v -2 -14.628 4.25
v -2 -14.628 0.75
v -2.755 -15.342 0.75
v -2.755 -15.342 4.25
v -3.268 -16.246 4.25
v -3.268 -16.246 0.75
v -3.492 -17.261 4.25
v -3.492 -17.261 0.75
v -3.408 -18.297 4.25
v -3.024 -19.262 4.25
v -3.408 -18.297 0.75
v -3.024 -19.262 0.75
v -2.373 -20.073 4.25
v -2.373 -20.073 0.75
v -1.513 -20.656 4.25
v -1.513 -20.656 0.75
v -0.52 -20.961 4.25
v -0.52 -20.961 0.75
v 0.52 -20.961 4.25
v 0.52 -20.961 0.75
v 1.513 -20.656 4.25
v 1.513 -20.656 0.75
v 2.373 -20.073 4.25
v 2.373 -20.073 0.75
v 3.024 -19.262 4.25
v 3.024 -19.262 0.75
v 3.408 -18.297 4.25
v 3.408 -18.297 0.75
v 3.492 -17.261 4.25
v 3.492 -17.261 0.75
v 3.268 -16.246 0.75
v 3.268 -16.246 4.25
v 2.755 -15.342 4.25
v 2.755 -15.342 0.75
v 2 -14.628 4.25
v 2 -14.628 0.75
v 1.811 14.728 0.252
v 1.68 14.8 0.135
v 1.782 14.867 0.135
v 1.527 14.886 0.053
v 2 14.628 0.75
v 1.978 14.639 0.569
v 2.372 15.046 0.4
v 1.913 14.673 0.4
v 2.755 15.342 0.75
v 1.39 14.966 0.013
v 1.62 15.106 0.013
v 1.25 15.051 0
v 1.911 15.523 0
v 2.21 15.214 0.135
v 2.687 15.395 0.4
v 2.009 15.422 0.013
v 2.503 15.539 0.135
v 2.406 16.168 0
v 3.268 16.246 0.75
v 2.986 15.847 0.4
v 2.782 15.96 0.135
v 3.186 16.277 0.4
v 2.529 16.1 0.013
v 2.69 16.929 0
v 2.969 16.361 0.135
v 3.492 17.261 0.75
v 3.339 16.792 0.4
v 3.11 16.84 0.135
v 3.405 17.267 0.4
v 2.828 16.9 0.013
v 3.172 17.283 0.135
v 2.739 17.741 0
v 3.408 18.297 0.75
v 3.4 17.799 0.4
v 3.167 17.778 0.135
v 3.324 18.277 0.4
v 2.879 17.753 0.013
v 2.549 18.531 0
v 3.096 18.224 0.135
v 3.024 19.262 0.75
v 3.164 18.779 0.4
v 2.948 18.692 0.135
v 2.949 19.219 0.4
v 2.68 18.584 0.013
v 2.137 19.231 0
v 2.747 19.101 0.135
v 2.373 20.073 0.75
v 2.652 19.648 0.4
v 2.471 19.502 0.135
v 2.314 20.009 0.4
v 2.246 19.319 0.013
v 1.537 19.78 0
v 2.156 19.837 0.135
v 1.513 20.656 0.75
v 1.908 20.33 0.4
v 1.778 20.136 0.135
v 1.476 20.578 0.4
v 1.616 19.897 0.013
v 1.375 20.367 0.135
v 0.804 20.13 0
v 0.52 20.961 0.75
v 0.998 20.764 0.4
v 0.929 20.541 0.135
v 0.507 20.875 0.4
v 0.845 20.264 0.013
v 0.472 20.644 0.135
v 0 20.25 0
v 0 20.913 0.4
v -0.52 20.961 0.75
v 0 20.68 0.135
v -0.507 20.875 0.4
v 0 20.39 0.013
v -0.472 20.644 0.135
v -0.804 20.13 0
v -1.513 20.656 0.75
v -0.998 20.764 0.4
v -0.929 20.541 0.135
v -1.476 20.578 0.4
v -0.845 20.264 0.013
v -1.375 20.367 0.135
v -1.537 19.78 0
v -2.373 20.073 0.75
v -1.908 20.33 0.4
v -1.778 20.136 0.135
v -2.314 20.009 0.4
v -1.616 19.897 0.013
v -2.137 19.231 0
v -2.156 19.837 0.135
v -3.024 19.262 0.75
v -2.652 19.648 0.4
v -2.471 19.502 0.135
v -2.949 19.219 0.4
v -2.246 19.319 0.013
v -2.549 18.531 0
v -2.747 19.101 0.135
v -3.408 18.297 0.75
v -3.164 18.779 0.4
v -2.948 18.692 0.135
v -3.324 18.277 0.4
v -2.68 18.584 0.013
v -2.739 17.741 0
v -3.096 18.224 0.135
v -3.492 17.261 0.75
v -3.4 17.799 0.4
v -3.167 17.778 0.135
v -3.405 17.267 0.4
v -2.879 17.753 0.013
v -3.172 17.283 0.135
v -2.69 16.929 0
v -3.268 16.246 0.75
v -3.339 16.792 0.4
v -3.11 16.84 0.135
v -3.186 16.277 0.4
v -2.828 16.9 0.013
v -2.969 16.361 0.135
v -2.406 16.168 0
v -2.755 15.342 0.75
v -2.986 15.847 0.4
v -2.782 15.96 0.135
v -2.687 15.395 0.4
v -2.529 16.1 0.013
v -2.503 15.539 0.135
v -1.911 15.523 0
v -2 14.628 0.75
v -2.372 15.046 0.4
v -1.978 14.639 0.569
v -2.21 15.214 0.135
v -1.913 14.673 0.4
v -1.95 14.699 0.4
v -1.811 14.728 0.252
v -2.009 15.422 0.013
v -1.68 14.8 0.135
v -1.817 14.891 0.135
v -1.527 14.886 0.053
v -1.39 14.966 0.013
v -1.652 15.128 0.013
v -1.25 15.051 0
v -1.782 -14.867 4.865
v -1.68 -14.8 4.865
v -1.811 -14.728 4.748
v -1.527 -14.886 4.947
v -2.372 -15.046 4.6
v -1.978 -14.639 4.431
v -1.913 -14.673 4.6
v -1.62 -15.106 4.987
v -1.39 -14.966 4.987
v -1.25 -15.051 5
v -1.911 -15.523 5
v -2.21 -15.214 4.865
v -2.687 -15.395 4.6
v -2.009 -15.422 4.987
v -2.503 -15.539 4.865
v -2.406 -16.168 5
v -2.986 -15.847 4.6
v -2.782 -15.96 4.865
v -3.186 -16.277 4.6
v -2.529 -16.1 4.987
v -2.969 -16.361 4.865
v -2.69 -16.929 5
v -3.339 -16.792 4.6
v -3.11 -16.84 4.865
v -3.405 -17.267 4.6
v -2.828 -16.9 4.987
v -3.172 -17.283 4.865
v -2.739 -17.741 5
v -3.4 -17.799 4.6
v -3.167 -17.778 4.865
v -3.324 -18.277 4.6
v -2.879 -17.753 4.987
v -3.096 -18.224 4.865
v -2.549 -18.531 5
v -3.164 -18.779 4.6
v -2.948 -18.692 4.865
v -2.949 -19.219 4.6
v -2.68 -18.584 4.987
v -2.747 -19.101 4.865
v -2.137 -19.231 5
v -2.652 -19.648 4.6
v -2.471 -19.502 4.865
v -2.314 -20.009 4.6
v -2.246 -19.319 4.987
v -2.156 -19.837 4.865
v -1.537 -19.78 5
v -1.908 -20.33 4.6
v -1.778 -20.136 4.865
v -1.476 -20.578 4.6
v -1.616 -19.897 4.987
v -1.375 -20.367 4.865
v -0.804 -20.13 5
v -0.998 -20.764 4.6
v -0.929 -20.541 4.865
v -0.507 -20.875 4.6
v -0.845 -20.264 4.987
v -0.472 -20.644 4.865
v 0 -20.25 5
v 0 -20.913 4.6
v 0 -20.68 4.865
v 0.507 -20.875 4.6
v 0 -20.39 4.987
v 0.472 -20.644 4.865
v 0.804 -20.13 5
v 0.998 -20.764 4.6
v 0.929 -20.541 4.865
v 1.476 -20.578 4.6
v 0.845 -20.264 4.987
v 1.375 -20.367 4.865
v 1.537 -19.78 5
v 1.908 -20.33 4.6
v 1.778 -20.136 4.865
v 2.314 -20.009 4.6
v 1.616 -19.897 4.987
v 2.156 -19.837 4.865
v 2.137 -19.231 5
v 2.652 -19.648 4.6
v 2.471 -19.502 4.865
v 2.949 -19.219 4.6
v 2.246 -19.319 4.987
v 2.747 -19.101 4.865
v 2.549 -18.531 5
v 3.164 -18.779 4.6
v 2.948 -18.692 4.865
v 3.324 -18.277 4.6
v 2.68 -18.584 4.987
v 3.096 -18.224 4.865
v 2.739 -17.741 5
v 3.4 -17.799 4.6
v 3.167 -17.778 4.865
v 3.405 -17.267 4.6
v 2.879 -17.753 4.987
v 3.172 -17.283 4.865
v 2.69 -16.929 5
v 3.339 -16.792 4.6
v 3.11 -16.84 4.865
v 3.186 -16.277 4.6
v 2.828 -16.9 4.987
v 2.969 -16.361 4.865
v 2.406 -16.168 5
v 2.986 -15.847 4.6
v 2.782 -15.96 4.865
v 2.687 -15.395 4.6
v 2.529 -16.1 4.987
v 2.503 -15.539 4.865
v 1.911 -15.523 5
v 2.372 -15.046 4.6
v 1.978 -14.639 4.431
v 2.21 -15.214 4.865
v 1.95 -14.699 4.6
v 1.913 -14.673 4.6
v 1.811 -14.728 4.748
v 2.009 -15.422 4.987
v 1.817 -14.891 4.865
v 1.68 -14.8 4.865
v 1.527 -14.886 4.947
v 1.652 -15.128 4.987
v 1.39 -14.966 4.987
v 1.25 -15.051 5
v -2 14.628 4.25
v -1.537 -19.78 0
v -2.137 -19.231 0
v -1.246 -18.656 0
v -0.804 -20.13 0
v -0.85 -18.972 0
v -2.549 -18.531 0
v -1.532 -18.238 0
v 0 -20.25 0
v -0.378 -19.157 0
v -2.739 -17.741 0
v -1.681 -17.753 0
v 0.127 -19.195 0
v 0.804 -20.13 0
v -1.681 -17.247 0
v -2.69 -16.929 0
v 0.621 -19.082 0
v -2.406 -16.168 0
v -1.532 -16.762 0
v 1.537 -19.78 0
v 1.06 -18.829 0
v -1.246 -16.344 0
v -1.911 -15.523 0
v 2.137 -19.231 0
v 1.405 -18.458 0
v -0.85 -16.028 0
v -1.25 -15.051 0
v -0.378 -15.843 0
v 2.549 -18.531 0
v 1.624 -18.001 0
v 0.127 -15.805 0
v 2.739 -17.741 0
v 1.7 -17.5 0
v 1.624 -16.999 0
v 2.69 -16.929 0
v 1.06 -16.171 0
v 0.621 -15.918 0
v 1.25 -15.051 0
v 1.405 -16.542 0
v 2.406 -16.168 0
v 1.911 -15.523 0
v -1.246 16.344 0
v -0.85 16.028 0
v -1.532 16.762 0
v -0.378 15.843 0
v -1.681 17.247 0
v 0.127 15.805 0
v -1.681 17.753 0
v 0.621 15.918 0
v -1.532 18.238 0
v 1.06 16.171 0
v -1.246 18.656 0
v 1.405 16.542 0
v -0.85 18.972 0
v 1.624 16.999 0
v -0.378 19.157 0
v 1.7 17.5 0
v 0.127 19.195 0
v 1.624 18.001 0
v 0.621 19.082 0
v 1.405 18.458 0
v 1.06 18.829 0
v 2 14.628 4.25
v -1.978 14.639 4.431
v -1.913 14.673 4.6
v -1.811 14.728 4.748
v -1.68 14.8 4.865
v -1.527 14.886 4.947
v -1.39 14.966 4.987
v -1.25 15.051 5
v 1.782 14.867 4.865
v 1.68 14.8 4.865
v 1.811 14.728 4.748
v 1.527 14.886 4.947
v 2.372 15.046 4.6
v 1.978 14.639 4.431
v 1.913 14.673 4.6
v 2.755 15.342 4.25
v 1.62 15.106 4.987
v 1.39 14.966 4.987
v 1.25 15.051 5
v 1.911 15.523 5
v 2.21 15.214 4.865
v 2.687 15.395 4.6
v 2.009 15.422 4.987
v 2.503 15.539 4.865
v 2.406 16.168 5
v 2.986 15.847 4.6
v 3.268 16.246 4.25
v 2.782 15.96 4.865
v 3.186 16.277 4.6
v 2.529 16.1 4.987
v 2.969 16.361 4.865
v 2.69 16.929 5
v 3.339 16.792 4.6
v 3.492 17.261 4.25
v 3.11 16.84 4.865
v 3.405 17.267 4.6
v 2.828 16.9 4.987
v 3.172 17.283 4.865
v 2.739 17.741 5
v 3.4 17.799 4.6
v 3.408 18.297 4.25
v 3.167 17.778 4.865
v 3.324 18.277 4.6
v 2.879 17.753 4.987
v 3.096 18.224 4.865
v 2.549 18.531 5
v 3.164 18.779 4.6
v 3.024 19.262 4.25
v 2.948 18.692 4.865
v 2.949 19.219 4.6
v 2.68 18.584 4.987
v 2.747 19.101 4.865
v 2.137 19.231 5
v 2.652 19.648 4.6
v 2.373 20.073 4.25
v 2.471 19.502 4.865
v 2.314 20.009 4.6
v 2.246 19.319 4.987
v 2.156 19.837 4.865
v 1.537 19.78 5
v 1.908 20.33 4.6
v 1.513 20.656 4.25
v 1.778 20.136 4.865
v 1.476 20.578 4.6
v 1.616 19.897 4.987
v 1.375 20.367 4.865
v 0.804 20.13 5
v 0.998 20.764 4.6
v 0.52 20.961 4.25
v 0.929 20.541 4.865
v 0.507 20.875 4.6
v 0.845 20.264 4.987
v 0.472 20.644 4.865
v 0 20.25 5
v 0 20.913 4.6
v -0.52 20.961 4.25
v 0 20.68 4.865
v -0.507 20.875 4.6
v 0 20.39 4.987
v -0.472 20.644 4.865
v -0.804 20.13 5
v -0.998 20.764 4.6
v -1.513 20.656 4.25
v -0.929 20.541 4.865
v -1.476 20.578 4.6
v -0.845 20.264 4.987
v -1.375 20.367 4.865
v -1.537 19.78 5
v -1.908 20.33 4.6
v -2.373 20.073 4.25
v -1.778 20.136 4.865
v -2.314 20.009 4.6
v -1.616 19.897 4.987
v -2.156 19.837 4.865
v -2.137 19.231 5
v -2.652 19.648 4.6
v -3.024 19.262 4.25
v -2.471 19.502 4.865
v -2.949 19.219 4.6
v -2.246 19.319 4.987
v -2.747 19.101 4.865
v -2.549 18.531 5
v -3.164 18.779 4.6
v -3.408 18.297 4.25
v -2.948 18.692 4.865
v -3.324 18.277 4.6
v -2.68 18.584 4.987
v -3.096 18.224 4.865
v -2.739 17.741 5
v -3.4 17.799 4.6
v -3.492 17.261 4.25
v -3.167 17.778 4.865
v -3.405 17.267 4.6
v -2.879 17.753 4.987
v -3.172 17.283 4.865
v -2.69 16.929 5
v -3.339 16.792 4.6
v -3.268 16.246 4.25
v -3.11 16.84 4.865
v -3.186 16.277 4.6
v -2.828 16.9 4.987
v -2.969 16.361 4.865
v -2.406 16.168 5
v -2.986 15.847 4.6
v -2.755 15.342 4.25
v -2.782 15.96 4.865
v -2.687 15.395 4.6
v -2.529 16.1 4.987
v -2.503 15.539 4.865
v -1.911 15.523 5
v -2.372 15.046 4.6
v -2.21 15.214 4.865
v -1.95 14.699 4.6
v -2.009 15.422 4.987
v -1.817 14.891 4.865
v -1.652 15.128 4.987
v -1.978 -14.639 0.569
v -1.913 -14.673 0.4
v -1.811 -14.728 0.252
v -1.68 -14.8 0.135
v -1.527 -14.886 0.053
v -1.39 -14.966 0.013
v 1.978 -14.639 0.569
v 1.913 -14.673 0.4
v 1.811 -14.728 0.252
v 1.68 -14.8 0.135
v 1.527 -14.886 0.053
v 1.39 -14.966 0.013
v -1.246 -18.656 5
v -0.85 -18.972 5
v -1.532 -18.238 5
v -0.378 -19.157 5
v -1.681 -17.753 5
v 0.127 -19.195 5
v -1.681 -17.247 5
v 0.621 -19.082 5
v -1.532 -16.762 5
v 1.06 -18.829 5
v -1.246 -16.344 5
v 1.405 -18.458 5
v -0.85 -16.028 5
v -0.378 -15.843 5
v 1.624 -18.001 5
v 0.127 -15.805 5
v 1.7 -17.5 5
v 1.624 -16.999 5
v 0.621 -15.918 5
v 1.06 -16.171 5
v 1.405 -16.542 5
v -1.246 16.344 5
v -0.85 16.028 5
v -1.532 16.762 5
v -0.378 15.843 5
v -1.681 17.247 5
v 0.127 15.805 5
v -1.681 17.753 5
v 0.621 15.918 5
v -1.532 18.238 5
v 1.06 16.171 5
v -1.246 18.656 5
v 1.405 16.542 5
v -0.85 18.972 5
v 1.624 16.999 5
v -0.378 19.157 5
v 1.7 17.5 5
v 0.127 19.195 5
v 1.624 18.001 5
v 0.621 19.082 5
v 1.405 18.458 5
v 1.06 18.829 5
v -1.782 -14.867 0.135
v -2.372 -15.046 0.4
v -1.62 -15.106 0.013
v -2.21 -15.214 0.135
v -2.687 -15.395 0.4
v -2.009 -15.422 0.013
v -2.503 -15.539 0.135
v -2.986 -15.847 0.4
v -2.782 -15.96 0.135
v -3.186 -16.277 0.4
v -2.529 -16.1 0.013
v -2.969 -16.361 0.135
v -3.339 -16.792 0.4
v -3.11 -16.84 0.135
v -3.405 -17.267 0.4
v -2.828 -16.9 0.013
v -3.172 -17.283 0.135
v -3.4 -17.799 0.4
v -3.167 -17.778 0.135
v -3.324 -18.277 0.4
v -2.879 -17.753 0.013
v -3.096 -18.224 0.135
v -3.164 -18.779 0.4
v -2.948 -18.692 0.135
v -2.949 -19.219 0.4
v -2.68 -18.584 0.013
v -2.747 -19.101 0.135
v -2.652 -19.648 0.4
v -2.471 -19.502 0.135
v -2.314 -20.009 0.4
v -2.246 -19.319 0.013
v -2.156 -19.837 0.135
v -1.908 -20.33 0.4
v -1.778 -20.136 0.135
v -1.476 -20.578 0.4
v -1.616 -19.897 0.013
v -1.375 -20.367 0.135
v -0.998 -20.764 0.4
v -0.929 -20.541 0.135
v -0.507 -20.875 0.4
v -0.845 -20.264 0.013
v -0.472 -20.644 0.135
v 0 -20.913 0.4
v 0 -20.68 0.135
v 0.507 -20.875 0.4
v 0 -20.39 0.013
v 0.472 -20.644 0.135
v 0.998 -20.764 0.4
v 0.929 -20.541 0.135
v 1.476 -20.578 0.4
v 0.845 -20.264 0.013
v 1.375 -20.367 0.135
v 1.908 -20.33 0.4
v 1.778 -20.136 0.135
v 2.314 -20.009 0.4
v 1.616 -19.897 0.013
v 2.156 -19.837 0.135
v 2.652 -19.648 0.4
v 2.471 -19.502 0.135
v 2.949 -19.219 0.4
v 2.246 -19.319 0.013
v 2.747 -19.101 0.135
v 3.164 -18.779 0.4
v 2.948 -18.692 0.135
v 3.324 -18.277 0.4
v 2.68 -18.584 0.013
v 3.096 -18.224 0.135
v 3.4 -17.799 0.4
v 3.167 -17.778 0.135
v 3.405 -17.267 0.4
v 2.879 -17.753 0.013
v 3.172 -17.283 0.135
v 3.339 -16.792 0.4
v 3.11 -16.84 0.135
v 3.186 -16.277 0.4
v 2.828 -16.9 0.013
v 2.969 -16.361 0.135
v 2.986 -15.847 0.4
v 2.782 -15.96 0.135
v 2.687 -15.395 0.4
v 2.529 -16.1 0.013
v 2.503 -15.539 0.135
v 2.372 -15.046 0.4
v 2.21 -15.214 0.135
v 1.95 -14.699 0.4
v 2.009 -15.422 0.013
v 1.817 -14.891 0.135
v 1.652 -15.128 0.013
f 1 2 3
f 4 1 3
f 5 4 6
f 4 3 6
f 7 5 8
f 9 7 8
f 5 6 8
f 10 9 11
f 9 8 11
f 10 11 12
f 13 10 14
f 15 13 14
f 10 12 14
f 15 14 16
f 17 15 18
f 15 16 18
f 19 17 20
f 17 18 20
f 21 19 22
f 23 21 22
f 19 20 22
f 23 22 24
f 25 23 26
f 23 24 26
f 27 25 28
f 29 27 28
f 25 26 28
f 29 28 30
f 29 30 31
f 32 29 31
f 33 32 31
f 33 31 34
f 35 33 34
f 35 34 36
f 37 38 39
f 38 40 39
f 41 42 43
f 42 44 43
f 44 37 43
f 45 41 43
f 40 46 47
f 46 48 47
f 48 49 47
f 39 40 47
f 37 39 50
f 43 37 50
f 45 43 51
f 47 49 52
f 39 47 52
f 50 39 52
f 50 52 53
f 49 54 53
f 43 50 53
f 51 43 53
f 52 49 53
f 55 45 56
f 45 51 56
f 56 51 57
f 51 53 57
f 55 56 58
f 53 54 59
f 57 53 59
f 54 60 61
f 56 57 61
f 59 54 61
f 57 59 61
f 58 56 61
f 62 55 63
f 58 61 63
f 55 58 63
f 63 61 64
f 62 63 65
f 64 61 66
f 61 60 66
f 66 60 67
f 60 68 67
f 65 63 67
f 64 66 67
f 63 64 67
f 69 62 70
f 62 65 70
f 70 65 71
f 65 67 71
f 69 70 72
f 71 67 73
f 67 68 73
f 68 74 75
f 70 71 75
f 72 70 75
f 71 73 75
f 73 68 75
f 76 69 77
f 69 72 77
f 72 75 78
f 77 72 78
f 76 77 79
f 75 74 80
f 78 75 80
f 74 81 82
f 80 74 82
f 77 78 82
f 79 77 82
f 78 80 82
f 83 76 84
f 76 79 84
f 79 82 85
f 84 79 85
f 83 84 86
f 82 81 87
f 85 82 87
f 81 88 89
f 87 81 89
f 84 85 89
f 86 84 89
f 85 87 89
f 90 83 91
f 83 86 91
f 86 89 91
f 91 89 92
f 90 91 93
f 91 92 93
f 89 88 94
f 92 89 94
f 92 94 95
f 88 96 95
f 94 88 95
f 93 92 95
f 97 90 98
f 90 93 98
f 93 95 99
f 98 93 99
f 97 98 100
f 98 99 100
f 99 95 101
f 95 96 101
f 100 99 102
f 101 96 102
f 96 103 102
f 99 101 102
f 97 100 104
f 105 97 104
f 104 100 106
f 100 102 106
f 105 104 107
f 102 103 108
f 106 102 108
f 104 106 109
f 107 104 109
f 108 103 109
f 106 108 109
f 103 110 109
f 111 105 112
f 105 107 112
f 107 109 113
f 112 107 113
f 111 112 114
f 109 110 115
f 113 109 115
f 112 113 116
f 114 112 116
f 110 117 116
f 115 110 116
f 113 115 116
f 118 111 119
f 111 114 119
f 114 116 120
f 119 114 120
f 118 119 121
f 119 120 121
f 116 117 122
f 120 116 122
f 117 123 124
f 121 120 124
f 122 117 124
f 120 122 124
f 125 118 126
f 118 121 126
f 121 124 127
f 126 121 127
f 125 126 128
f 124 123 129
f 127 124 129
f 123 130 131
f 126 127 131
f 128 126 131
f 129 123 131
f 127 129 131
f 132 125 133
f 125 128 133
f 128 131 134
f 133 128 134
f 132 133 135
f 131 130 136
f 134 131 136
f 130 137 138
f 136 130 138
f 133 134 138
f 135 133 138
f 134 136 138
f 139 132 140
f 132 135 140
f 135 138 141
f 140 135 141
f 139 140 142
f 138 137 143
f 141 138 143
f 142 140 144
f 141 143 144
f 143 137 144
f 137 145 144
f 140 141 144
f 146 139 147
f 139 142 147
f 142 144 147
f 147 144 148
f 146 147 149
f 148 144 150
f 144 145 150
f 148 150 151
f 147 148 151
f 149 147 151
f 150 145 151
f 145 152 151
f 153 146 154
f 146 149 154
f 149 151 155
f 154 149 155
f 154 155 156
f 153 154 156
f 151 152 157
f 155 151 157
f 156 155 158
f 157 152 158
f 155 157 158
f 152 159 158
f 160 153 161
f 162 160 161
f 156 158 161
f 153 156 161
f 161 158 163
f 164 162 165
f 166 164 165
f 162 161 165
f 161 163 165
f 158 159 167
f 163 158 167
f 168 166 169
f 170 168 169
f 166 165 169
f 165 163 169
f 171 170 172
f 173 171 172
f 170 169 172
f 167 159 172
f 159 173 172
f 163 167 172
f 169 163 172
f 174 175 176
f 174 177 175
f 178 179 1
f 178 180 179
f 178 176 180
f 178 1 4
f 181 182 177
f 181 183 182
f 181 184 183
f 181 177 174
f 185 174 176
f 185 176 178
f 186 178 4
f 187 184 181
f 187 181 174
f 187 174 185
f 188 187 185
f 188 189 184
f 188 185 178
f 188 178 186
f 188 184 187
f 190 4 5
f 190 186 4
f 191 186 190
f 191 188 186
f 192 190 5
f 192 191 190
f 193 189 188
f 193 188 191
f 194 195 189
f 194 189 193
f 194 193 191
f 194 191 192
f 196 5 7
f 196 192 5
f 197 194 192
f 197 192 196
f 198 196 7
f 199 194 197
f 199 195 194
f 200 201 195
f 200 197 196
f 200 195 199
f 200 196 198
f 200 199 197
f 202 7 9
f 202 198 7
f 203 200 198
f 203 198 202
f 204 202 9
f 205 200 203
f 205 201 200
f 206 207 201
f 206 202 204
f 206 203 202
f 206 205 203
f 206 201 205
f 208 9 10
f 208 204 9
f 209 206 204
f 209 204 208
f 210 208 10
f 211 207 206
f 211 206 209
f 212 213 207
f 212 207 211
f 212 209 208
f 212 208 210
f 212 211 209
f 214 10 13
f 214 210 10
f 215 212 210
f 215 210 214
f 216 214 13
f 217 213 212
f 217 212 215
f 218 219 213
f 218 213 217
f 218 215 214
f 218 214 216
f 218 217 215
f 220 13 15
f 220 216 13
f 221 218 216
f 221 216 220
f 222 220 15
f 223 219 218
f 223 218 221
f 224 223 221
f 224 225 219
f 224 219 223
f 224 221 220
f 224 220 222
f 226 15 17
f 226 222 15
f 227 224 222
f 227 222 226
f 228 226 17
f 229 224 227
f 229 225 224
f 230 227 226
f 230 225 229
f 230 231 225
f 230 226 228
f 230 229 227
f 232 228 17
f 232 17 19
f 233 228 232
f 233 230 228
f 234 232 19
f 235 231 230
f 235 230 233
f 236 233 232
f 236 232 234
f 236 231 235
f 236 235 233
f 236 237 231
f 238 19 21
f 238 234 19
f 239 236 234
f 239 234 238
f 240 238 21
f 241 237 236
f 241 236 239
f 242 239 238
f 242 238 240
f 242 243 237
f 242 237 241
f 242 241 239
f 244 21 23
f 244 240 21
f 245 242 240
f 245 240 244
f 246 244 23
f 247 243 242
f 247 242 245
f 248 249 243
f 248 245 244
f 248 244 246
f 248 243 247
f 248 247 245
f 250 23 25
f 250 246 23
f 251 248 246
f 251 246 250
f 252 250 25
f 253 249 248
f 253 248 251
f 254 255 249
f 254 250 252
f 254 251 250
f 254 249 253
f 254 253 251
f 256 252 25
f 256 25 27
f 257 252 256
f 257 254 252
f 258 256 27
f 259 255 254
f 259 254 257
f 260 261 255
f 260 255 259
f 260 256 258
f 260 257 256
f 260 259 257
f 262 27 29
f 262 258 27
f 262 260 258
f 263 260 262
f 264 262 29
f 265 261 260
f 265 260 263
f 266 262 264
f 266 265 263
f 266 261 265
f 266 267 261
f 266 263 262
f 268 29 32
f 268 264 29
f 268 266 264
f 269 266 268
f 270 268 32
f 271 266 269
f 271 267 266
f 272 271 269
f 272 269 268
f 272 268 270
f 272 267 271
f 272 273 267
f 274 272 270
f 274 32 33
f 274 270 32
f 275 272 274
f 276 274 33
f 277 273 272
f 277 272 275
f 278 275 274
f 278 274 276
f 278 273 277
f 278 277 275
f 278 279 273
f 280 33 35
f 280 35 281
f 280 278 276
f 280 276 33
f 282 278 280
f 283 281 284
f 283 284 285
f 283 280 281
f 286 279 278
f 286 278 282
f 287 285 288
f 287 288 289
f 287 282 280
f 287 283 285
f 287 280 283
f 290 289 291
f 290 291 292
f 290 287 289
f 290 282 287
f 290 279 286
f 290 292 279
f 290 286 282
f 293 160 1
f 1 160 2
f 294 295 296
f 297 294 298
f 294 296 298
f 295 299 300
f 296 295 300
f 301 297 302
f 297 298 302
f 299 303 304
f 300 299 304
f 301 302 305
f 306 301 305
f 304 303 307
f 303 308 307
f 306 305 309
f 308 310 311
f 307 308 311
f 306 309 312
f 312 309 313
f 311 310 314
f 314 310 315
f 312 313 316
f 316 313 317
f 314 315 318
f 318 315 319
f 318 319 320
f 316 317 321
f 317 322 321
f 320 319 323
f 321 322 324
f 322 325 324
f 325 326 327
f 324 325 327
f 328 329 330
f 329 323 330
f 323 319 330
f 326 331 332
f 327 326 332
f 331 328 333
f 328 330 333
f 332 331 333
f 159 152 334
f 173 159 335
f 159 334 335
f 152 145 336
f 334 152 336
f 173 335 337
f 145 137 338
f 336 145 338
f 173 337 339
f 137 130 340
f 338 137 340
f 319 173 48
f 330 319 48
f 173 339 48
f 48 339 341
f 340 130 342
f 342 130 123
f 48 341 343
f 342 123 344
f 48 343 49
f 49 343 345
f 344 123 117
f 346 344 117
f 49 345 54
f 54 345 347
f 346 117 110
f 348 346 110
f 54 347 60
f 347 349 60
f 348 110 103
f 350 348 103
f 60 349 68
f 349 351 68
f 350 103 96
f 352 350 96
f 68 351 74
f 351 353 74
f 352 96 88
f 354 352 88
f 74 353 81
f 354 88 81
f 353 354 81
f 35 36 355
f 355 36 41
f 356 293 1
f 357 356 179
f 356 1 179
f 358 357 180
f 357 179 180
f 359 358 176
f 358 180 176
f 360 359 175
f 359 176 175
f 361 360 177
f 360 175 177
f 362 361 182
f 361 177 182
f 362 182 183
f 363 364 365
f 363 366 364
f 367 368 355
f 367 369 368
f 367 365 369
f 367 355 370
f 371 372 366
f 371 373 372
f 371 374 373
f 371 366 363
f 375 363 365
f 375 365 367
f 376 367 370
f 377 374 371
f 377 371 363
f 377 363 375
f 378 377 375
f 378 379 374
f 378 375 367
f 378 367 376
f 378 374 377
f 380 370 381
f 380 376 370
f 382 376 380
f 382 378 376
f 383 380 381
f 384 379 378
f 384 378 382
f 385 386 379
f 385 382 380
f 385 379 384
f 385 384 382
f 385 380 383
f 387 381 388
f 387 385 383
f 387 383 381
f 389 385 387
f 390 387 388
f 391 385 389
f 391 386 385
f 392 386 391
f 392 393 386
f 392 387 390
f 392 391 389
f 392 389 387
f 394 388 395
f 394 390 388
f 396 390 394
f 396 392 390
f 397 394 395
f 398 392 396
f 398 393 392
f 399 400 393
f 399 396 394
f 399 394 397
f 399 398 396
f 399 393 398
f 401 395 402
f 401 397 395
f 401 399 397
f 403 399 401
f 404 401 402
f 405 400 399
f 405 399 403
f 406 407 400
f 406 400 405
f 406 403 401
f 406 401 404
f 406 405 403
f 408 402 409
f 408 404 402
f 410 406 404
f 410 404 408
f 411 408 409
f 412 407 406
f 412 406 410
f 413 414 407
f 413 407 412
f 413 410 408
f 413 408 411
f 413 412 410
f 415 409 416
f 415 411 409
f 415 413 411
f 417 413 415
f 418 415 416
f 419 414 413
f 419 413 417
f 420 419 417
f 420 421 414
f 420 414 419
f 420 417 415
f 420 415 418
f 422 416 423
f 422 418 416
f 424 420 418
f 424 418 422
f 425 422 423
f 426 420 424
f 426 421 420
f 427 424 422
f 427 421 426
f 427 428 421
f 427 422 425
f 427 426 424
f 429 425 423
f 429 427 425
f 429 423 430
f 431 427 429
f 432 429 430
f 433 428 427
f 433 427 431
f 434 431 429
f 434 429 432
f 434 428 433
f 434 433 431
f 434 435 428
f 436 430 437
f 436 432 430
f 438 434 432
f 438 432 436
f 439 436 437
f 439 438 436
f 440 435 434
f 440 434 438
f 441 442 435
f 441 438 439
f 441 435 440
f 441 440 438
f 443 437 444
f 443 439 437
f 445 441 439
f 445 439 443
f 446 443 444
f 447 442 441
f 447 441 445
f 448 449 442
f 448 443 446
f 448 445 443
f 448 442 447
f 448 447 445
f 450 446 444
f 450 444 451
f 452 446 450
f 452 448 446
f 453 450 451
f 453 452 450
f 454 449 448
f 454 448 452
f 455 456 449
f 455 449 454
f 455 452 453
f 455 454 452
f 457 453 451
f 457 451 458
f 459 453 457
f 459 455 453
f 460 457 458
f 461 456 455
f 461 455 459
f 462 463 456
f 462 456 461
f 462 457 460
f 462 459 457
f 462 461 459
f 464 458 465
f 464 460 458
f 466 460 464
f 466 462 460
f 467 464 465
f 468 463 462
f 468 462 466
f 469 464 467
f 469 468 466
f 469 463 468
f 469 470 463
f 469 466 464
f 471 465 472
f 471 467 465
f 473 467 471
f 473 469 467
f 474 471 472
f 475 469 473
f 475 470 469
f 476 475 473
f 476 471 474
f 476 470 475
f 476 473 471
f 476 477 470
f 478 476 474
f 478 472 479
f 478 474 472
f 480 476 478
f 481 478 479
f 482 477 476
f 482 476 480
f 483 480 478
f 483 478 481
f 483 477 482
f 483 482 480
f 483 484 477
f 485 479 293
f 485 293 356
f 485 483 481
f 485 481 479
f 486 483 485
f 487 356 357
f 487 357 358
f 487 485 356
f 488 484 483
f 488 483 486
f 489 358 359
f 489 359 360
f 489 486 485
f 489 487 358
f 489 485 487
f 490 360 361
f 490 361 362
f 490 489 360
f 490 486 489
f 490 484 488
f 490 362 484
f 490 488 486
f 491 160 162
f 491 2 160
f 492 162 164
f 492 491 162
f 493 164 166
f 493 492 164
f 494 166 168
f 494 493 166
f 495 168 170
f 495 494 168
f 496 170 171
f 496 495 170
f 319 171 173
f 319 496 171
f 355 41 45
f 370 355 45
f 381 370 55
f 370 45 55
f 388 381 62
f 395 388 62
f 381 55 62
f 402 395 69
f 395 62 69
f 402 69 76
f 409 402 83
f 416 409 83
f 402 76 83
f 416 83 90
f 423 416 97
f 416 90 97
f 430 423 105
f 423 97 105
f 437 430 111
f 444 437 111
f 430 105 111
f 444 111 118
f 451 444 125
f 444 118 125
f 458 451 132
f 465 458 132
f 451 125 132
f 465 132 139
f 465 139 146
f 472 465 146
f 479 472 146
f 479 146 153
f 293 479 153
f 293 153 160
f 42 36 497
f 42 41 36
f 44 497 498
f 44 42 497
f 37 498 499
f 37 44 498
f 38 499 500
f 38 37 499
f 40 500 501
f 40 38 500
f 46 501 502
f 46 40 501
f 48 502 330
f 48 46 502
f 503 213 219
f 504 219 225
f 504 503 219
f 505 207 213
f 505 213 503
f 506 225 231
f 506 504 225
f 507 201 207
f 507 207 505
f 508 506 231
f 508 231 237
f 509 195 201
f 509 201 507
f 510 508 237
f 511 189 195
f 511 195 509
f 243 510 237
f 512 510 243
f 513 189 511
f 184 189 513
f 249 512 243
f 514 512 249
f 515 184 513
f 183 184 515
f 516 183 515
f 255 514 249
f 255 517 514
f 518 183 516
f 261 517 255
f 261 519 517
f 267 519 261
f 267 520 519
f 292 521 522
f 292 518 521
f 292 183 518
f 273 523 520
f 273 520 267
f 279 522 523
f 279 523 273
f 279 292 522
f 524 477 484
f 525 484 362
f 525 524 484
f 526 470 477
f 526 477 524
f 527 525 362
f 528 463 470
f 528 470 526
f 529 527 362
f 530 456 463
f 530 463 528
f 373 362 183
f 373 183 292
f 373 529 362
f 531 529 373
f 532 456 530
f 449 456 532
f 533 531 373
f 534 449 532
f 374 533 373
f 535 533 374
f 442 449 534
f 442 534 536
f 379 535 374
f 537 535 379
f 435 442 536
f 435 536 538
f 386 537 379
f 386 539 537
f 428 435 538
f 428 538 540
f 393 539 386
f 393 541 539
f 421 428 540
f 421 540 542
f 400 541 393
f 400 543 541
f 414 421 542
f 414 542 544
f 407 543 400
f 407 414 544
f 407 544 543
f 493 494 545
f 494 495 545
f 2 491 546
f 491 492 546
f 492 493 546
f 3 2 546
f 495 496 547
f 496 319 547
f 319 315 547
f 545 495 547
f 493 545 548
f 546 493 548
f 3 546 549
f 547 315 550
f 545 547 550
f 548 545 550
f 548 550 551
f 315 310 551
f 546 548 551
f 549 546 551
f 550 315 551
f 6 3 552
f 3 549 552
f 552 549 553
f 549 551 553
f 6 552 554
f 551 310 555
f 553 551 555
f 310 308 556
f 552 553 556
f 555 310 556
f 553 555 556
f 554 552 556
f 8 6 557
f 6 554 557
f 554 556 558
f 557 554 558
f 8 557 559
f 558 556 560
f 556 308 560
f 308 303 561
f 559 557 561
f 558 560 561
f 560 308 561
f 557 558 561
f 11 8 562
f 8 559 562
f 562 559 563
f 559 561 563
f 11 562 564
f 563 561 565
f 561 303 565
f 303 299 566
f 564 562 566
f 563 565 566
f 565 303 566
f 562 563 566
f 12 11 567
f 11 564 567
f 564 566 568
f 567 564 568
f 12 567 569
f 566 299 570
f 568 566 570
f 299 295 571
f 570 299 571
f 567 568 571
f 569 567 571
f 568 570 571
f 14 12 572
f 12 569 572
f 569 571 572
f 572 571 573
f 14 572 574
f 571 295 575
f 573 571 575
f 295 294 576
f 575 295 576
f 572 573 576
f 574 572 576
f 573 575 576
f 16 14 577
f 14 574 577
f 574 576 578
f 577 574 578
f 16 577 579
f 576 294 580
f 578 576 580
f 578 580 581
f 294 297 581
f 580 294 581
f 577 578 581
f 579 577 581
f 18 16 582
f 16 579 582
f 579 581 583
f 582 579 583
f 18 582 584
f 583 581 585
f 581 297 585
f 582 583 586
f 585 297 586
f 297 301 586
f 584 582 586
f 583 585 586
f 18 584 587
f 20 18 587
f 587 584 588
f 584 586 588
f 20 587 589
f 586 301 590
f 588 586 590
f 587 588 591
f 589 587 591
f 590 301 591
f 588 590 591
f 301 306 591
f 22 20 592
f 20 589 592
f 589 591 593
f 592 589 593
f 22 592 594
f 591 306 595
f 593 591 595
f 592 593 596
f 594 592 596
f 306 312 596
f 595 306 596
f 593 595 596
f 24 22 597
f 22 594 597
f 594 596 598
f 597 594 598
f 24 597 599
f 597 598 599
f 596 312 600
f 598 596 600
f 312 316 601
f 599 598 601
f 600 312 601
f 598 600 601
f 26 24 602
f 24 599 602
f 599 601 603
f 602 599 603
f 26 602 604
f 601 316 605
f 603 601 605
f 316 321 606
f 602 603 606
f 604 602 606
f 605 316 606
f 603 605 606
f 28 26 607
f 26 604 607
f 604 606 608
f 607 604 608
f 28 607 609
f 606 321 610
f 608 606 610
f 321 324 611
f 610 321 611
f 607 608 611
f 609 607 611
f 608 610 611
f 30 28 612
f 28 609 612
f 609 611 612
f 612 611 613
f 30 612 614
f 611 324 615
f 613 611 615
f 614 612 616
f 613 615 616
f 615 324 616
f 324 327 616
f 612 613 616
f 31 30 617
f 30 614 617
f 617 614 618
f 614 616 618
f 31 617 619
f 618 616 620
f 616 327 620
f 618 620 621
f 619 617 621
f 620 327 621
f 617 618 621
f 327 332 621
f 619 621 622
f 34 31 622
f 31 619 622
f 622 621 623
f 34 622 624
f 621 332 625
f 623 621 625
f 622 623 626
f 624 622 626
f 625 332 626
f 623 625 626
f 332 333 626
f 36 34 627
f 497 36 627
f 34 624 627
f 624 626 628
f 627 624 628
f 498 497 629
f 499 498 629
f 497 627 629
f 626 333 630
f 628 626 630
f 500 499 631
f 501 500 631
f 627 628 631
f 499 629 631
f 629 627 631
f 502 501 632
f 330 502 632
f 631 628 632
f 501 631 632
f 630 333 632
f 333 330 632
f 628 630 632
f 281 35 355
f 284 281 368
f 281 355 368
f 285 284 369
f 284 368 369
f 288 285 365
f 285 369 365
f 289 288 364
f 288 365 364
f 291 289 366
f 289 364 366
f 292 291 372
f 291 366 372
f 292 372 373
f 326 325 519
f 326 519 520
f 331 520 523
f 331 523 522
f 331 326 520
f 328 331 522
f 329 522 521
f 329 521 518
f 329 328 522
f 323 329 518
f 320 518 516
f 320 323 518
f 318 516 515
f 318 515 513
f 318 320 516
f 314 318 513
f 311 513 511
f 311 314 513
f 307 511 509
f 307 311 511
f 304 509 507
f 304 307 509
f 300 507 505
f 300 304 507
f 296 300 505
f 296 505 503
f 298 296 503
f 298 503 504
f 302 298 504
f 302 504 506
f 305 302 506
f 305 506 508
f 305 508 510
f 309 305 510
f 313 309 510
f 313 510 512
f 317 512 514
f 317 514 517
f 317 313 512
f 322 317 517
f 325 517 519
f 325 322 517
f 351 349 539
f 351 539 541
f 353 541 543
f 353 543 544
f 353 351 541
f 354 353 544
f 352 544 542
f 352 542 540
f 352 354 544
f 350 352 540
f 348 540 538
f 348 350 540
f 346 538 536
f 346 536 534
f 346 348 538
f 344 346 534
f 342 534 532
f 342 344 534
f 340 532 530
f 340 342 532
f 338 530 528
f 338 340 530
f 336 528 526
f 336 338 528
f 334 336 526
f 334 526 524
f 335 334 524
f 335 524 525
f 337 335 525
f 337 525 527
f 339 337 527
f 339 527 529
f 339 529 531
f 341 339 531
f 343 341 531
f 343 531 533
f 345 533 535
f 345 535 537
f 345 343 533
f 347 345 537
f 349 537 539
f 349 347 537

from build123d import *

# Parameters (mm, degrees)
CROQUIS1_R              = 1.7
SALIENTE_EXTRUIR1_DEPTH = 5
REDONDEO1_R             = 0.75


with BuildPart() as part:
    # Croquis1 → Saliente-Extruir1 (new body)
    with BuildSketch(Plane.XY):
        with BuildLine():
            Line((2, -14.627718677), (2, 14.627718677))
            ThreePointArc((2, 14.627718677), (0, 21), (-2, 14.627718677))
            Line((-2, 14.627718677), (-2, -14.627718677))
            ThreePointArc((-2, -14.627718677), (0, -21), (2, -14.627718677))
        make_face()
        with Locations((0, -17.5)):
            Circle(CROQUIS1_R, mode=Mode.SUBTRACT)
        with Locations((0, 17.5)):
            Circle(CROQUIS1_R, mode=Mode.SUBTRACT)
    extrude(amount=SALIENTE_EXTRUIR1_DEPTH)

    # Redondeo1
    redondeo1_edges = [part.edges().sort_by_distance(p)[0] for p in [
        (0, -21, 5),
        (2, 0, 5),
        (0, 21, 5),
        (2, 0, 0),
        (0, -21, 0),
        (-2, 0, 0),
        (0, 21, 0),
        (-2, 0, 5),
    ]]
    fillet(redondeo1_edges, radius=REDONDEO1_R)


solid = part.part
